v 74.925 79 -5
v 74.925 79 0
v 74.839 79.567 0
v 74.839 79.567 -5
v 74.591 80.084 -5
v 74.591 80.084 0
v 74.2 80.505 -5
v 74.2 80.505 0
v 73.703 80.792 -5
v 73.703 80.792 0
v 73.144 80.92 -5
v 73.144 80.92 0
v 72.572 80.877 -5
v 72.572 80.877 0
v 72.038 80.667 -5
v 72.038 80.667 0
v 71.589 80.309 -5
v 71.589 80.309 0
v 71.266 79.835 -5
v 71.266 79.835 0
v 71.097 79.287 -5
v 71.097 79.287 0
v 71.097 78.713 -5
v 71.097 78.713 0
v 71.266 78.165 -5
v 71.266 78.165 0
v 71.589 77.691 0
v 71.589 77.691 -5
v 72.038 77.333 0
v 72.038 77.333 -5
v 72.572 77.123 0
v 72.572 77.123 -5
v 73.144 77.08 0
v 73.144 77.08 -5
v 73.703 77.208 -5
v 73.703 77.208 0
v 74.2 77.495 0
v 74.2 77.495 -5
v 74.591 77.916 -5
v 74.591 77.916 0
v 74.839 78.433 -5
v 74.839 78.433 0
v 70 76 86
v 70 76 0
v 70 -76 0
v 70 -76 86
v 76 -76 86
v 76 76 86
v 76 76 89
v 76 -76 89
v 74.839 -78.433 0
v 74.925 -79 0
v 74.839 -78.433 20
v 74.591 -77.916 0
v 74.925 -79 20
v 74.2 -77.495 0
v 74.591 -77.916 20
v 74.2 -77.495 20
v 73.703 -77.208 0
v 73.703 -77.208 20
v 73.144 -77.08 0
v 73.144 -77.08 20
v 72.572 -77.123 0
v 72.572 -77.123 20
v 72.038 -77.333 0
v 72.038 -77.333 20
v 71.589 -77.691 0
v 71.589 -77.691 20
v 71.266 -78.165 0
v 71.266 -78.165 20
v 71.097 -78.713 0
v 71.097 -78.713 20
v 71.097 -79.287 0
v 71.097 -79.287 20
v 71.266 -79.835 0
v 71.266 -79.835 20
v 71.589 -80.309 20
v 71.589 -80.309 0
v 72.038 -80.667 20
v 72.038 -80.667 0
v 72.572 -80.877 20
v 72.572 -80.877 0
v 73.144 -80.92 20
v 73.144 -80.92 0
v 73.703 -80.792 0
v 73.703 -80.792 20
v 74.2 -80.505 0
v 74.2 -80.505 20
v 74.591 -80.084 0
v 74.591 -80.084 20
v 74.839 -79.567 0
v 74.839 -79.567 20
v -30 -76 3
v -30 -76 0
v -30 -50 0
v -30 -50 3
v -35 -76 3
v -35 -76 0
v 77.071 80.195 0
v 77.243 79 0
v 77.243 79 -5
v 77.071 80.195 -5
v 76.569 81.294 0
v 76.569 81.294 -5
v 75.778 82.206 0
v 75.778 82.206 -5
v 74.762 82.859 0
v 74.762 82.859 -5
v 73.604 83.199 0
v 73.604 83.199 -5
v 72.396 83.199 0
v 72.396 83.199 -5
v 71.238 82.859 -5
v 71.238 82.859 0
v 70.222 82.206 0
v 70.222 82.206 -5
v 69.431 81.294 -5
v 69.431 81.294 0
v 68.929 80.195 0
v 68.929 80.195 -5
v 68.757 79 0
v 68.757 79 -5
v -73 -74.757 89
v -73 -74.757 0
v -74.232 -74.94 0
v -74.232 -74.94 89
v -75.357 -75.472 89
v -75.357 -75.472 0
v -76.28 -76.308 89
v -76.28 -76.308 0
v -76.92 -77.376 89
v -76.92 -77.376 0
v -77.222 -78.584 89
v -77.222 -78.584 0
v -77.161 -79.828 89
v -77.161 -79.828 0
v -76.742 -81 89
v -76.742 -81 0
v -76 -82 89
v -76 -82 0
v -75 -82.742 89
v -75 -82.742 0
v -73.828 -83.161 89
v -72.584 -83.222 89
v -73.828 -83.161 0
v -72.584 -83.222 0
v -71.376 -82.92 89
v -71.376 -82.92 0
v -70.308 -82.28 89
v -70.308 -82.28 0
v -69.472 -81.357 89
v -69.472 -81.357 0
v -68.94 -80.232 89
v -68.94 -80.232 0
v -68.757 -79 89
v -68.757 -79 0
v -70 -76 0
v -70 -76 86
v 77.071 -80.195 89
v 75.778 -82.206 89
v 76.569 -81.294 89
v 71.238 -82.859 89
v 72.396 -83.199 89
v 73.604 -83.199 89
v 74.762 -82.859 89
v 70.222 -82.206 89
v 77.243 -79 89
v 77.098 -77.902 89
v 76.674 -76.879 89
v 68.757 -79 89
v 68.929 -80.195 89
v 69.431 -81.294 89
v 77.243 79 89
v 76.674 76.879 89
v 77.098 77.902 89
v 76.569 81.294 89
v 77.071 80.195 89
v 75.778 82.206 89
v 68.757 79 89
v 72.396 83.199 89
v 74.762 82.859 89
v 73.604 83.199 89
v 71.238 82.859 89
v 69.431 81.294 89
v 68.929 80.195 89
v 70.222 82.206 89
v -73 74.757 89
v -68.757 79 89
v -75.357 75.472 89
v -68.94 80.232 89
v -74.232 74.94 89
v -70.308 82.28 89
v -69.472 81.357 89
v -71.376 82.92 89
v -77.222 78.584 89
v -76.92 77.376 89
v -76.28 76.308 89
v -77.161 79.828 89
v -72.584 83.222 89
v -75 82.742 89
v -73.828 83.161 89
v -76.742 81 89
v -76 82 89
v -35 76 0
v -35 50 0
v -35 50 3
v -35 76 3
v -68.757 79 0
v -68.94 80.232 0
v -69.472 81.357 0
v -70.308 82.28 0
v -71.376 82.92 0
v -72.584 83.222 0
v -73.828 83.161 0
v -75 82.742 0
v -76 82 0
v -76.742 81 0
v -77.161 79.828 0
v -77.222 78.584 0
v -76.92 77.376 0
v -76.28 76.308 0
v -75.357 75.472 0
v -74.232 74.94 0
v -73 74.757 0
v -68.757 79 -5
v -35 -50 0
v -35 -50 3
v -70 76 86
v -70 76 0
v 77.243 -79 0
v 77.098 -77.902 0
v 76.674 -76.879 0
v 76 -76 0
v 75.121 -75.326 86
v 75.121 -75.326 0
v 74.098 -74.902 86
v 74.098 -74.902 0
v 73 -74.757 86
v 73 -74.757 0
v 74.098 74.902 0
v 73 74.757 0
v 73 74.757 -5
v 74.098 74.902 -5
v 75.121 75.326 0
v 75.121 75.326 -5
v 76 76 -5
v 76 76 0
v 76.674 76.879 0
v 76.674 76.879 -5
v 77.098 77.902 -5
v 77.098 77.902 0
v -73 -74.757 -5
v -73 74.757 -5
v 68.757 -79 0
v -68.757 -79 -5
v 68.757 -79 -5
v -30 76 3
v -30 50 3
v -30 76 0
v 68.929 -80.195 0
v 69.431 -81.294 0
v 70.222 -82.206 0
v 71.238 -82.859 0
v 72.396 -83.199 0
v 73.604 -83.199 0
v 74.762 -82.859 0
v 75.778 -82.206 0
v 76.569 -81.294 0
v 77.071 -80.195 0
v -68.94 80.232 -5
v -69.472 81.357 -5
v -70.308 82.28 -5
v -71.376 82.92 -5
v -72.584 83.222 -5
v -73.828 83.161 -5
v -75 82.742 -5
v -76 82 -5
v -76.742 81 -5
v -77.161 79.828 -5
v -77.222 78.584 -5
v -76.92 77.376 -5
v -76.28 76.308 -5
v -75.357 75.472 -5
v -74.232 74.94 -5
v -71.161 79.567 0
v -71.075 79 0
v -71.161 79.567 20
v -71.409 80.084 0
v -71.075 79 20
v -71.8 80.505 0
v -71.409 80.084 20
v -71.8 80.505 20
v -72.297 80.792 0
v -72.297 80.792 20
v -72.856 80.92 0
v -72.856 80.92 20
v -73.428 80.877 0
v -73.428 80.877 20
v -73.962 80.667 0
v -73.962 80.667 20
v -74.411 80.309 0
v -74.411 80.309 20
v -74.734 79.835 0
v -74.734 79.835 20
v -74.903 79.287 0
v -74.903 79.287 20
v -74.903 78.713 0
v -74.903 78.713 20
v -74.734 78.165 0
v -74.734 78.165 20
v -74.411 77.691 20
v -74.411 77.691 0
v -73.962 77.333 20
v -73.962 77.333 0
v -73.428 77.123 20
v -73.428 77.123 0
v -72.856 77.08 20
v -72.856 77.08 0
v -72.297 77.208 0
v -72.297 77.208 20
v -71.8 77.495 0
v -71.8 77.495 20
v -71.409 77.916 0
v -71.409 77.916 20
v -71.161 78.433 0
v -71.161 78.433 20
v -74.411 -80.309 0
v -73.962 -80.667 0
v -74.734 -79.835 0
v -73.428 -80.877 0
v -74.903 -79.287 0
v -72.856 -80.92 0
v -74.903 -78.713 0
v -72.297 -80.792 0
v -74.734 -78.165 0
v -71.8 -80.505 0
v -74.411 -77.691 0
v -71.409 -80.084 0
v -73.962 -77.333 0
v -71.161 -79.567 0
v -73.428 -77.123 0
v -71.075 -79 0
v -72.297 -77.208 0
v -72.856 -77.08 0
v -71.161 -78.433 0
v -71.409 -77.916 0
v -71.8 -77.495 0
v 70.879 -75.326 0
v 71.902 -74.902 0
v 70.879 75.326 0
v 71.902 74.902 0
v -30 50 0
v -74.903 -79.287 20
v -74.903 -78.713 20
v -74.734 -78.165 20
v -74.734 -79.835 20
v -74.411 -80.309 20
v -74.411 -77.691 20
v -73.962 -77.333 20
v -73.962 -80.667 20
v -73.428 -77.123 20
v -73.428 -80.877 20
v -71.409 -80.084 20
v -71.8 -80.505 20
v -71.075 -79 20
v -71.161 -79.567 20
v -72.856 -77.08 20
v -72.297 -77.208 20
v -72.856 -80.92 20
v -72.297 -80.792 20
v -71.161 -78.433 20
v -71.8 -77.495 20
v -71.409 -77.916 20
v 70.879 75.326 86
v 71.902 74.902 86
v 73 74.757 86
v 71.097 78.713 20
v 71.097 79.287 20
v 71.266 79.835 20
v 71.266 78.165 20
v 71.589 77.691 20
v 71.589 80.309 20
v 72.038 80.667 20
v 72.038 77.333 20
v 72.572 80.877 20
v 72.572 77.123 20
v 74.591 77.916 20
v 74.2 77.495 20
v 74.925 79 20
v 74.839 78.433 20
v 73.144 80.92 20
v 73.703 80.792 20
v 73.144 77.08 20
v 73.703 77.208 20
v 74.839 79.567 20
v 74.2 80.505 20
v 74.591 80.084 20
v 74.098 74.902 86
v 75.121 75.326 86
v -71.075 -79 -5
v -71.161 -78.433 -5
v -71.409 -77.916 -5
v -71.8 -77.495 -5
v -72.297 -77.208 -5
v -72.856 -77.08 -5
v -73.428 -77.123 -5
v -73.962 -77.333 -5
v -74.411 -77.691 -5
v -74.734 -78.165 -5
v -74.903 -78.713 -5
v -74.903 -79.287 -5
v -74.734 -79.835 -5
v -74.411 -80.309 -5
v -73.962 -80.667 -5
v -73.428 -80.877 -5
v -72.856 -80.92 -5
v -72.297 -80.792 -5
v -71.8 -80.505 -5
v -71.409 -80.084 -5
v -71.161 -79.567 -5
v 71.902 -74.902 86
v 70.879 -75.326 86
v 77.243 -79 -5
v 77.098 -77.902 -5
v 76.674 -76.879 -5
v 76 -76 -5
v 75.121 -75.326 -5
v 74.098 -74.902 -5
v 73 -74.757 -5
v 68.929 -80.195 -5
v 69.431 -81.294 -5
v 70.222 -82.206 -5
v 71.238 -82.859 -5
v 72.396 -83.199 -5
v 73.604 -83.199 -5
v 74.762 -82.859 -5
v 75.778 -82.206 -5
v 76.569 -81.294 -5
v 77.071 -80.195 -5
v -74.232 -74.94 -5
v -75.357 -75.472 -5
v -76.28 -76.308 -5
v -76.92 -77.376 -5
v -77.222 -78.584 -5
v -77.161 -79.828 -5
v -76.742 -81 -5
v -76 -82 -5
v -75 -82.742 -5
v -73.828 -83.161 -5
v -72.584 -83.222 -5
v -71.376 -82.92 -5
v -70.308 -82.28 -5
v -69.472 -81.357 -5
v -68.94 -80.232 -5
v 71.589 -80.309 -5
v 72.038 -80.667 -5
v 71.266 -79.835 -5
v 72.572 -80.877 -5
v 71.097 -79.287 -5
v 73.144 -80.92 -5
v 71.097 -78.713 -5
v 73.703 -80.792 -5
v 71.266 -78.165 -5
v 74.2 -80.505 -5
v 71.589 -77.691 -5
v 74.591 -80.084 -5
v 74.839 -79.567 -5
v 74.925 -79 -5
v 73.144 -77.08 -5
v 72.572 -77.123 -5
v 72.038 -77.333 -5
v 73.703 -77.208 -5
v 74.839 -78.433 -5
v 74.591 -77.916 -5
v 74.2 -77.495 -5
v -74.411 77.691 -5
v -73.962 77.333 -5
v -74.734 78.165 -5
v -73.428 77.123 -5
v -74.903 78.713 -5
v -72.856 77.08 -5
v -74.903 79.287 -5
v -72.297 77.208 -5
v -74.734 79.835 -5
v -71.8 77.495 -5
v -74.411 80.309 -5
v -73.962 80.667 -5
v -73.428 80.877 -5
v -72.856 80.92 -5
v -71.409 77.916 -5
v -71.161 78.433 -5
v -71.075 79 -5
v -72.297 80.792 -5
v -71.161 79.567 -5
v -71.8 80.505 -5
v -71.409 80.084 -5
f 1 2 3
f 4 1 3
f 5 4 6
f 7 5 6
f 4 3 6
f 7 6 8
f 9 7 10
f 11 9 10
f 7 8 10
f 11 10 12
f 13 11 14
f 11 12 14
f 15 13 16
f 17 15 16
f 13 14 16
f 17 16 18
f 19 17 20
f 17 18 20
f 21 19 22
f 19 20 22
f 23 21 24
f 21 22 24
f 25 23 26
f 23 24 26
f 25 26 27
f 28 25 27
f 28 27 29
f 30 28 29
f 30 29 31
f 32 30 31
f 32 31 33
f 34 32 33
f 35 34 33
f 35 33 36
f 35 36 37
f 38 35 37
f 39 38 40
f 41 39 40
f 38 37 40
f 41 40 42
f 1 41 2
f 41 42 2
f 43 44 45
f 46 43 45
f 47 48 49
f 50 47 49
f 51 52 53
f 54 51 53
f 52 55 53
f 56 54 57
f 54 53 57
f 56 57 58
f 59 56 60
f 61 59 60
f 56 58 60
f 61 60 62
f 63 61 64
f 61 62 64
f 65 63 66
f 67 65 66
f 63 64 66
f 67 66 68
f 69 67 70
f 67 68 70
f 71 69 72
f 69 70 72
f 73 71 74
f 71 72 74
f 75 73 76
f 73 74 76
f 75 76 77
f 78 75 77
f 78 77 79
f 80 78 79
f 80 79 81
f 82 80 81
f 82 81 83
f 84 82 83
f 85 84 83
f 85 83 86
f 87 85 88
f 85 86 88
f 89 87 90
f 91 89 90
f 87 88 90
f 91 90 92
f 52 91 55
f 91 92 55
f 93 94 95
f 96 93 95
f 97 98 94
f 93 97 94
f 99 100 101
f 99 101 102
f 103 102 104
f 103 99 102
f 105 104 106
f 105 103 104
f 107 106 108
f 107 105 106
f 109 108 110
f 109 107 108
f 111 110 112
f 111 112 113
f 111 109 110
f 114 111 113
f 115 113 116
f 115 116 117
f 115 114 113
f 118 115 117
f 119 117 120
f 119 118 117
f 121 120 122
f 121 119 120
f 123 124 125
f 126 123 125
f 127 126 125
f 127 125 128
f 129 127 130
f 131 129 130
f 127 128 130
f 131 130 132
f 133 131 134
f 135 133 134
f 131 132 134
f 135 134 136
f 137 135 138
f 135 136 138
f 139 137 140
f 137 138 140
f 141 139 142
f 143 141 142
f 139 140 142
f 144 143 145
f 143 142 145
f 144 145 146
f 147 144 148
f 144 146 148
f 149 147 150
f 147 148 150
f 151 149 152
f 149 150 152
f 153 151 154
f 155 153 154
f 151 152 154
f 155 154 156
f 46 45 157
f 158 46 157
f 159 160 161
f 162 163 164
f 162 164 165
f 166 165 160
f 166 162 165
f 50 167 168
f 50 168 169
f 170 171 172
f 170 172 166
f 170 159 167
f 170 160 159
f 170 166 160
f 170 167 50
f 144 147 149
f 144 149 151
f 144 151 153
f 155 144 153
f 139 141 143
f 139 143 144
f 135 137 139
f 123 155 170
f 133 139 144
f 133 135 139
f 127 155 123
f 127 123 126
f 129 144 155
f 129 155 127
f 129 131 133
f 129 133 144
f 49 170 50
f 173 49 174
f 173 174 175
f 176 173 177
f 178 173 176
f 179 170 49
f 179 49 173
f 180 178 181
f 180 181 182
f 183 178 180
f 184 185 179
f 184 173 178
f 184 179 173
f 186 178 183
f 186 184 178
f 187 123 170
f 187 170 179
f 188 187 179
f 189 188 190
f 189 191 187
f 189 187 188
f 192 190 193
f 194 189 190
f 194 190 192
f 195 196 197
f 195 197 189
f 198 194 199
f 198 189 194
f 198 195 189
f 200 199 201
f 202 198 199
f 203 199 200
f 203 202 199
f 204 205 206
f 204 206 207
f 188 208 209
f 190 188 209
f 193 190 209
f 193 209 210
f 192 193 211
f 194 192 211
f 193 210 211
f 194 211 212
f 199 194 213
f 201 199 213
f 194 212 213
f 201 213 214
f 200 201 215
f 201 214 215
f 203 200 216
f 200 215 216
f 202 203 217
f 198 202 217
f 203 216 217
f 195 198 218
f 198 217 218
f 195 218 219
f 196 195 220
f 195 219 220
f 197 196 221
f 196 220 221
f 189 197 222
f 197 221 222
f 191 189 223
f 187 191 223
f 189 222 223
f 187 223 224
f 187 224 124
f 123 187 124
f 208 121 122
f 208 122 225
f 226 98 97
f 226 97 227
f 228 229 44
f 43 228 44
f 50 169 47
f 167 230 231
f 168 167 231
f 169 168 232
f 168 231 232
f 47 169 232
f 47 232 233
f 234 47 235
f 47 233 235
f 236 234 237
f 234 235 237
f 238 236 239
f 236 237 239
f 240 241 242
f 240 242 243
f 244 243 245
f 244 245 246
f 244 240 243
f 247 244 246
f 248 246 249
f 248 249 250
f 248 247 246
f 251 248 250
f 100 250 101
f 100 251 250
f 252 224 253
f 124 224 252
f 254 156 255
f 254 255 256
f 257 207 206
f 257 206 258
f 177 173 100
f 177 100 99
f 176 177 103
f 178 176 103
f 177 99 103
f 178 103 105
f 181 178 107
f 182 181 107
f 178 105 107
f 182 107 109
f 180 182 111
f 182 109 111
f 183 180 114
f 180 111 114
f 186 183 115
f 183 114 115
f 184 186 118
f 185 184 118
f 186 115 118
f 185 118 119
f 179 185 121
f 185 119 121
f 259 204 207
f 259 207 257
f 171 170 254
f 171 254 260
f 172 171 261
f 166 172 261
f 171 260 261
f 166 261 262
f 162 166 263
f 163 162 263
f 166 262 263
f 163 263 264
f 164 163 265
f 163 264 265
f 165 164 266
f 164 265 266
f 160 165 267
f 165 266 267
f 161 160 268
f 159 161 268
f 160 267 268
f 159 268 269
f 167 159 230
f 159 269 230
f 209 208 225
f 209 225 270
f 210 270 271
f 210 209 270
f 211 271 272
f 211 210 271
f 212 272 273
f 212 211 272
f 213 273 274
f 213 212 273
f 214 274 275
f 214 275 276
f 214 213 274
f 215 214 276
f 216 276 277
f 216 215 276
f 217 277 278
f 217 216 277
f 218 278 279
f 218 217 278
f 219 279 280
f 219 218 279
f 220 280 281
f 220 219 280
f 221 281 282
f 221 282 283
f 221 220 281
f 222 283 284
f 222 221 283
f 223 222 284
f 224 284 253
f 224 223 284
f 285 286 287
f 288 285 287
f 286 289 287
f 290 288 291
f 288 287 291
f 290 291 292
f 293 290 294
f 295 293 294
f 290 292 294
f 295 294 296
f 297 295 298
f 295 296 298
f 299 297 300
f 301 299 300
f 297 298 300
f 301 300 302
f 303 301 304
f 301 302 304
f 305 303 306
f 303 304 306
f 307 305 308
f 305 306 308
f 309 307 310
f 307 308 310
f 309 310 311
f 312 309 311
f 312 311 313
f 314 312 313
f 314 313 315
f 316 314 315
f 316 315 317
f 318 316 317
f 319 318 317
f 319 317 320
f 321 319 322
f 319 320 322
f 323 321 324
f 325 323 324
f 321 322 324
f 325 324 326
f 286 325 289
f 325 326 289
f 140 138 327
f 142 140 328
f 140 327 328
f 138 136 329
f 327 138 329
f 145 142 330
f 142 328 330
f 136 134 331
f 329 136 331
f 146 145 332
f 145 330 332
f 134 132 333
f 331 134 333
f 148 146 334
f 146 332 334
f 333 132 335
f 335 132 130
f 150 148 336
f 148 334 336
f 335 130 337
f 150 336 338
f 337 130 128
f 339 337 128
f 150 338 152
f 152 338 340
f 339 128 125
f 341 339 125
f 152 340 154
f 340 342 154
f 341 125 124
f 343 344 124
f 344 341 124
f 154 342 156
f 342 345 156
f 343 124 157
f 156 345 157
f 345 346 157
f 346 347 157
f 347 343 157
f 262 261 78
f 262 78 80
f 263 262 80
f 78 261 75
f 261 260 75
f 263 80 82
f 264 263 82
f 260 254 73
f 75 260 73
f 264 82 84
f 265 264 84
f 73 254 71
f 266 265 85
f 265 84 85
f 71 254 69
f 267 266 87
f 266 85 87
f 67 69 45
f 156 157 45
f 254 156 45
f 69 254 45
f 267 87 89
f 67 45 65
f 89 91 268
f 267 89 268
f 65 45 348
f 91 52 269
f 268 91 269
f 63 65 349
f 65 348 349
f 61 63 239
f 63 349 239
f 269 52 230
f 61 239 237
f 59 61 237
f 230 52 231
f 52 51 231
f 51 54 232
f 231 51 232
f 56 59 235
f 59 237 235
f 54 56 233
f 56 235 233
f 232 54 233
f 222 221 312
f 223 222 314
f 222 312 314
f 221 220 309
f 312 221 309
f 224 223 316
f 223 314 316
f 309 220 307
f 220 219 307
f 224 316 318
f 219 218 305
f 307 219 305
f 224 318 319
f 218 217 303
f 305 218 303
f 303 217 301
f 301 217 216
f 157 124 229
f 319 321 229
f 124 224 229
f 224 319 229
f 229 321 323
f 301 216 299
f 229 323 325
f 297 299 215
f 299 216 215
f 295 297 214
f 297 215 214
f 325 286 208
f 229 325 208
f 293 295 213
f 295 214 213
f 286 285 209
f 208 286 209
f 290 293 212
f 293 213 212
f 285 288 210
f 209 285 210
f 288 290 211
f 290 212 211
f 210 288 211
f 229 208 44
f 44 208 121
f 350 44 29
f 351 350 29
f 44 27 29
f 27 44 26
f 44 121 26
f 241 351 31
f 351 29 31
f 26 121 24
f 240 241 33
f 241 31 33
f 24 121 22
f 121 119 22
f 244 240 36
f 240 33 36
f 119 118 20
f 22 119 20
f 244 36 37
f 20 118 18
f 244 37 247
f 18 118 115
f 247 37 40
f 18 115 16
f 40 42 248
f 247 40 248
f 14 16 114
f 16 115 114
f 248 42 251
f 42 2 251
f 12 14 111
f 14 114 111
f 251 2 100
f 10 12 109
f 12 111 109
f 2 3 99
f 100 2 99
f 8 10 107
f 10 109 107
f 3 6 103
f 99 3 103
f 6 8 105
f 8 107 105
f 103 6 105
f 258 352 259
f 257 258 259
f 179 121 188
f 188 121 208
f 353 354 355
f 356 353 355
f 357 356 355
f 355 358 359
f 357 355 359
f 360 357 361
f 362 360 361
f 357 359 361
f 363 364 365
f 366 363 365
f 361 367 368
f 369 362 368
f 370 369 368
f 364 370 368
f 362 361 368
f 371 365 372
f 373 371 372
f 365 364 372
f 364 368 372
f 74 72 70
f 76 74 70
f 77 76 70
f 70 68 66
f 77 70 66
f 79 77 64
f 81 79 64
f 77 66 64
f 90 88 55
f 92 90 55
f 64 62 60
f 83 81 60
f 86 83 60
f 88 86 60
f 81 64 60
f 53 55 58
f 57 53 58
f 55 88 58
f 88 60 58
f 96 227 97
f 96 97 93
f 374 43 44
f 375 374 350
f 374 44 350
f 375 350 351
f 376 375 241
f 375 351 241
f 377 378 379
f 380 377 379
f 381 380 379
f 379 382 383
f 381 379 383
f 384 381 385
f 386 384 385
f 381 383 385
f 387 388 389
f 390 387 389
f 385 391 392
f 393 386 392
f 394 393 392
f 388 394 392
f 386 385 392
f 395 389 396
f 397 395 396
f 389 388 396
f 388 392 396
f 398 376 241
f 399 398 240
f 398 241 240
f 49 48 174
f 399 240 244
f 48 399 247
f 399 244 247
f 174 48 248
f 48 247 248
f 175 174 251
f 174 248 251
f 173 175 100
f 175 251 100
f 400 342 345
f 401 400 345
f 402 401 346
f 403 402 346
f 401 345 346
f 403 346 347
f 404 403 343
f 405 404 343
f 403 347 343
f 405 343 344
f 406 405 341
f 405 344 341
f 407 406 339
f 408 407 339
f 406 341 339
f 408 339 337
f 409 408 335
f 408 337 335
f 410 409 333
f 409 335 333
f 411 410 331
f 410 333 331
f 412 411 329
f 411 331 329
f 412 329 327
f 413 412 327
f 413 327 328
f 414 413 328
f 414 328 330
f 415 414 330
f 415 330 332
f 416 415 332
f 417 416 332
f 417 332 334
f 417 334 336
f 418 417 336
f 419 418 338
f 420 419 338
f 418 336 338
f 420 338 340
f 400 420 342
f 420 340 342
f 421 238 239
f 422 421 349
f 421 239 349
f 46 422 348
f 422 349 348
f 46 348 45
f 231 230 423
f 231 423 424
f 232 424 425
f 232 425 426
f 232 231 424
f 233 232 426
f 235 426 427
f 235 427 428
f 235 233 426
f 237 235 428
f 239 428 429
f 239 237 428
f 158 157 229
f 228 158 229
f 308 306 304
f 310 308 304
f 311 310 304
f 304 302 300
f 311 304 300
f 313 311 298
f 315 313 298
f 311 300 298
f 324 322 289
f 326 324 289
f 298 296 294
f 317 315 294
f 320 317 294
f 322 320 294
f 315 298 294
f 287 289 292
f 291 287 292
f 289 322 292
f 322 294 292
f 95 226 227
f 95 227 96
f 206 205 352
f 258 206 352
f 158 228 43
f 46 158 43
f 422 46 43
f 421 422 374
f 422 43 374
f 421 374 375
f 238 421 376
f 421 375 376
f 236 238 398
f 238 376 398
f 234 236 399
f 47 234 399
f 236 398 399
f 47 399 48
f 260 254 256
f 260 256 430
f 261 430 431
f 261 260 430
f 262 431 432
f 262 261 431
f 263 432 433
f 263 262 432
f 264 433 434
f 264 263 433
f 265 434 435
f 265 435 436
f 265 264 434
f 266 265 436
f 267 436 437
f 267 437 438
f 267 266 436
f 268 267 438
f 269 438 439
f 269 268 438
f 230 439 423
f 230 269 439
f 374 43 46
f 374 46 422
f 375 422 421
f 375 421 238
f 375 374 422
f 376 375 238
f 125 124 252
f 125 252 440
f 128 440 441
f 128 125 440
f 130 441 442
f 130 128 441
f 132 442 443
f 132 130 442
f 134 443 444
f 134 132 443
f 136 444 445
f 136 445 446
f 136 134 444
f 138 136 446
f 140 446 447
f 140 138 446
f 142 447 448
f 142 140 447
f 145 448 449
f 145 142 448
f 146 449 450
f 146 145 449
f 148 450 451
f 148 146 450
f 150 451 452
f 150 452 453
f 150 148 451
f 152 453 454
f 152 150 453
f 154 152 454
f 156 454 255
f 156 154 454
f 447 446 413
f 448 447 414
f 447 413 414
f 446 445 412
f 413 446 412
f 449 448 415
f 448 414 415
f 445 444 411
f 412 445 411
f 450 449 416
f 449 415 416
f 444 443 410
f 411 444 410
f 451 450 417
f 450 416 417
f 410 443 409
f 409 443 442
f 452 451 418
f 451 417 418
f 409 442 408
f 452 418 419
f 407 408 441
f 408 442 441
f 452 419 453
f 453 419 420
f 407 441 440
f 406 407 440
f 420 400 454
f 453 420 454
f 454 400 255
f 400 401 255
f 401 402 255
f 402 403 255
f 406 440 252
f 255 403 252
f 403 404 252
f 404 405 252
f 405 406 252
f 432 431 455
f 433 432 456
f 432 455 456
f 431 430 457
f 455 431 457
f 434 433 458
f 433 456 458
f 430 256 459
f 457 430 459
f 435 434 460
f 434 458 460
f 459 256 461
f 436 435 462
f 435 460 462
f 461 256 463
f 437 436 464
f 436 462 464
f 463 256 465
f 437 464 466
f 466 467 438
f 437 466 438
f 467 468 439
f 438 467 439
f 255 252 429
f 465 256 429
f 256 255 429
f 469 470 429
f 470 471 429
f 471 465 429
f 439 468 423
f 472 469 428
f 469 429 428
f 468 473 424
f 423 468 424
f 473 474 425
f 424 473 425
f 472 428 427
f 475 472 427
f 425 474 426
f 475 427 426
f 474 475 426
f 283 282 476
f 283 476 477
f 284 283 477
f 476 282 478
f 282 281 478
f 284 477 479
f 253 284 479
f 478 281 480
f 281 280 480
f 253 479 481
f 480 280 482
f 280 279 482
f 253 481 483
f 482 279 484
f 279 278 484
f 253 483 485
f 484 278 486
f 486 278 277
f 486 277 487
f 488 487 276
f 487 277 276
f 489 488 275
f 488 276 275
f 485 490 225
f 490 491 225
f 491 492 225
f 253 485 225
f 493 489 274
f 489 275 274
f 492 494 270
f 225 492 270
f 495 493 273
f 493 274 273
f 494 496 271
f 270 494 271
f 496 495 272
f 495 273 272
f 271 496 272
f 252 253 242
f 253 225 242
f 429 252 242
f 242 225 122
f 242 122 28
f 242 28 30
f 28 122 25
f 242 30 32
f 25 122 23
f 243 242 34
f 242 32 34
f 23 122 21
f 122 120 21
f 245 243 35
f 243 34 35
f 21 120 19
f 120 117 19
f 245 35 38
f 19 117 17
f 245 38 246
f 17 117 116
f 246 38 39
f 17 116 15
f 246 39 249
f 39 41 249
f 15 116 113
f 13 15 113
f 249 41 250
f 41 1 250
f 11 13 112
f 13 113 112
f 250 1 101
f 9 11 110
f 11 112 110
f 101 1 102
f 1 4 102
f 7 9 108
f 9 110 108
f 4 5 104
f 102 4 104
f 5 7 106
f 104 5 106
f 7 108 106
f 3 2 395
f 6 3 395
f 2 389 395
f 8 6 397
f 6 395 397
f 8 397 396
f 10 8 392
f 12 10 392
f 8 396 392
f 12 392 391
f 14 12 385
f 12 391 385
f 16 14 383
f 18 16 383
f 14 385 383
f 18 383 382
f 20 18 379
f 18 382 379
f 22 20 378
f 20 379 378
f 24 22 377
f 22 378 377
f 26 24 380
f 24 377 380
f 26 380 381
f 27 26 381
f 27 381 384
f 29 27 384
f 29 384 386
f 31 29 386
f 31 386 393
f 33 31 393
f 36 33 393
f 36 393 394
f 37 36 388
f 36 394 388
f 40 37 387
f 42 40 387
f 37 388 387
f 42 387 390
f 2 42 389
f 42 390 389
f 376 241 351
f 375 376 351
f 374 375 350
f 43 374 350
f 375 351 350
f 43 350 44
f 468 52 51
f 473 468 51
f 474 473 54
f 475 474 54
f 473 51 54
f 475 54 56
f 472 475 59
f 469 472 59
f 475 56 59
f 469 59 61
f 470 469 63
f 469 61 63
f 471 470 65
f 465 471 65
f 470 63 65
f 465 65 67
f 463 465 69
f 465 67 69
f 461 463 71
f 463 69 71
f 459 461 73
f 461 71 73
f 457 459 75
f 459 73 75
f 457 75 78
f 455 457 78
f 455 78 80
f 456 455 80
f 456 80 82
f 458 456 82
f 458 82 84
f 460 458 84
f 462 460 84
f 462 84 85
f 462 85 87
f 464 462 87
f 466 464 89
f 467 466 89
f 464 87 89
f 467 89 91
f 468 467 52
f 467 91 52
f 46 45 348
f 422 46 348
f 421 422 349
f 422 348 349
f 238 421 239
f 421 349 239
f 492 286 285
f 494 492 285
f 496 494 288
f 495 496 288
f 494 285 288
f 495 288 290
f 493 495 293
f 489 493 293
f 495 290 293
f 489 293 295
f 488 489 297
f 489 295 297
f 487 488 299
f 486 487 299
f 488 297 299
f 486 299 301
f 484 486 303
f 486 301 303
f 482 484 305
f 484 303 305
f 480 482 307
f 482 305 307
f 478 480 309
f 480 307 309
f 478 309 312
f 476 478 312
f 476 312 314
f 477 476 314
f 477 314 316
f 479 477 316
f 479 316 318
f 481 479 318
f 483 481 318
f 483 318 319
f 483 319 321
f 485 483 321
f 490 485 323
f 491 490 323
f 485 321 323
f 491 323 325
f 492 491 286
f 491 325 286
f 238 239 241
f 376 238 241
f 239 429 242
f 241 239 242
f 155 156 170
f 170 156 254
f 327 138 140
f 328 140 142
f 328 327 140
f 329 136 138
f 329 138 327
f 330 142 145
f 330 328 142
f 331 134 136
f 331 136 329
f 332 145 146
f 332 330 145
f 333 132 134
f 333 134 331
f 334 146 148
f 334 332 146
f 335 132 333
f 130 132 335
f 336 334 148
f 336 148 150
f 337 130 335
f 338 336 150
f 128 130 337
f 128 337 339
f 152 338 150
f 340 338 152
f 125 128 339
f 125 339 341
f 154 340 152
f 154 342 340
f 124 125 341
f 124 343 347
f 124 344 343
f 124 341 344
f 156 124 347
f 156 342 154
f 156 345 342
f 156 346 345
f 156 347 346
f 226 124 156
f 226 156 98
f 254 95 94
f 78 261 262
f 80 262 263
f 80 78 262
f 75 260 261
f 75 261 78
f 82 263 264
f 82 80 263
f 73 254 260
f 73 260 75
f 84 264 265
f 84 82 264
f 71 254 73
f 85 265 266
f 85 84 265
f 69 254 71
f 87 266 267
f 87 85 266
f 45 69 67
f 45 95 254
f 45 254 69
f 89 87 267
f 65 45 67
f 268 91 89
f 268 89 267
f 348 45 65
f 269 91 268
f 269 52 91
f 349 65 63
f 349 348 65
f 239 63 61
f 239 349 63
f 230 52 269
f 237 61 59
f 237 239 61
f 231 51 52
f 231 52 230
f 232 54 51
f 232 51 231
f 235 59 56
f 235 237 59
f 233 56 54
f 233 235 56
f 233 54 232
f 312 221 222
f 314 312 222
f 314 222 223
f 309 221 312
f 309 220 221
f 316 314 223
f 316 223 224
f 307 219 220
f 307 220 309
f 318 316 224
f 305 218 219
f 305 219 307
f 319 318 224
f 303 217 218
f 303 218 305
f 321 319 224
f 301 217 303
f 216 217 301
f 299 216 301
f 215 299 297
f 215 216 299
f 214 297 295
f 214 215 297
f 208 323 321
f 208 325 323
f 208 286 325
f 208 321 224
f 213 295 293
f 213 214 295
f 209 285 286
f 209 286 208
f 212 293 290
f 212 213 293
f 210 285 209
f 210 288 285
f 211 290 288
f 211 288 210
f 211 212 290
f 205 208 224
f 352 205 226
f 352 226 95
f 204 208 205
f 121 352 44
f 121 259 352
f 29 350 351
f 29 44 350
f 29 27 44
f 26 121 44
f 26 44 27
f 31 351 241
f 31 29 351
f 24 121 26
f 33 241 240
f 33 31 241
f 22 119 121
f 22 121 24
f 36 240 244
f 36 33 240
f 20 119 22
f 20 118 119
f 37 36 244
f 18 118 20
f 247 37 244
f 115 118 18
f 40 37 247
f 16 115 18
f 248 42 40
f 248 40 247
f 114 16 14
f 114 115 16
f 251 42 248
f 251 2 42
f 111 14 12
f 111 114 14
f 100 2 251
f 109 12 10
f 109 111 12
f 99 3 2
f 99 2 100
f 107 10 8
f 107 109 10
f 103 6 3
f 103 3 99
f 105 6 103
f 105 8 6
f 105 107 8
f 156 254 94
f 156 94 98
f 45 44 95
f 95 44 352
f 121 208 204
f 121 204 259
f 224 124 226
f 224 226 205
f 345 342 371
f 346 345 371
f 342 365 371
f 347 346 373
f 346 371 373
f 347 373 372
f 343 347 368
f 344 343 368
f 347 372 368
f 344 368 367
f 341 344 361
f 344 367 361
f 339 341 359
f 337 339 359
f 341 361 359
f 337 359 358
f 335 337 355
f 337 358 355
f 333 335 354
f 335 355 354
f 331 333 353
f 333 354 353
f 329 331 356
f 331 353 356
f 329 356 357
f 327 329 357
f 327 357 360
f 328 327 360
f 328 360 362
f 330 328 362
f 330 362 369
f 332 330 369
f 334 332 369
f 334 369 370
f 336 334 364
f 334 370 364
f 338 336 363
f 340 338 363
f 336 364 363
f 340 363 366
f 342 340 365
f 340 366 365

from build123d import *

# Parameters (mm, degrees)
F0_W          = 5
F0_H          = 26
F1_DEPTH      = 5
F2_DEPTH      = 86
F3_DEPTH      = 3
F4_DEPTH      = 89
F5_START      = 86
F5_DEPTH      = 3
F6_R          = 1.925
F7_DEPTH      = 20
F7_DEPTH_BACK = 5
F8_DEPTH      = 3
F9_DEPTH      = 1.2426406871
F10_DEPTH     = 1.2426406871


# Not quite as in the source:
# - a feature names something its author has since deleted; it is built from what else it names


with BuildPart() as f1:
    # F0 (on Top) → F1 (new body)
    with BuildSketch(Plane.XY):
        with BuildLine():
            ThreePointArc((73, 74.7573593129), (71.3764116996, 75.0803111054), (70, 76))
            Line((70, 76), (70, -76))
            ThreePointArc((70, -76), (71.3764116996, -75.0803111054), (73, -74.7573593129))
            Line((73, -74.7573593129), (73, 74.7573593129))
        make_face()
        Polygon((70, -76), (70, 76), (-30, 76), (-30, 50), (-30, -50), (-30, -76), align=None)
        Polygon((-35, 50), (-35, 76), (-70, 76), (-70, -76), (-35, -76), (-35, -50), (-30, -50), (-30, 50), align=None)
        with Locations((-32.5, -63)):
            Rectangle(F0_W, F0_H)
        with Locations((-32.5, 63)):
            Rectangle(F0_W, F0_H)
        with BuildLine():
            Line((-70, -76), (-70, 76))
            ThreePointArc((-70, 76), (-71.3764116996, 75.0803111054), (-73, 74.7573593129))
            Line((-73, 74.7573593129), (-73, -74.7573593129))
            ThreePointArc((-73, -74.7573593129), (-71.3764116996, -75.0803111054), (-70, -76))
        make_face()
        with BuildLine():
            ThreePointArc((73, -74.7573593129), (71.3764116996, -75.0803111054), (70, -76))
            Line((70, -76), (73, -76))
            Line((73, -76), (73, -74.7573593129))
        make_face()
        with BuildLine():
            Line((73, -76), (70, -76))
            ThreePointArc((70, -76), (69.0803111054, -77.3764116996), (68.7573593129, -79))
            Line((68.7573593129, -79), (73, -79))
            Line((73, -79), (73, -76))
        make_face()
        with BuildLine():
            Line((73, -74.7573593129), (73, -76))
            Line((73, -76), (73, -79))
            Line((73, -79), (68.7573593129, -79))
            ThreePointArc((68.7573593129, -79), (73, -83.2426406871), (77.2426406871, -79))
            ThreePointArc((77.2426406871, -79), (76, -76), (73, -74.7573593129))
        make_face()
        with BuildLine():
            Line((73, 76), (70, 76))
            ThreePointArc((70, 76), (71.3764116996, 75.0803111054), (73, 74.7573593129))
            Line((73, 74.7573593129), (73, 76))
        make_face()
        with BuildLine():
            ThreePointArc((68.7573593129, 79), (69.0803111054, 77.3764116996), (70, 76))
            Line((70, 76), (73, 76))
            Line((73, 76), (73, 79))
            Line((73, 79), (68.7573593129, 79))
        make_face()
        with BuildLine():
            Line((73, 79), (73, 76))
            Line((73, 76), (73, 74.7573593129))
            ThreePointArc((73, 74.7573593129), (76, 76), (77.2426406871, 79))
            ThreePointArc((77.2426406871, 79), (73, 83.2426406871), (68.7573593129, 79))
            Line((68.7573593129, 79), (73, 79))
        make_face()
        with BuildLine():
            Line((-30, 76), (70, 76))
            ThreePointArc((70, 76), (69.0803111054, 77.3764116996), (68.7573593129, 79))
            Line((68.7573593129, 79), (-68.7573593129, 79))
            ThreePointArc((-68.7573593129, 79), (-69.0803111054, 77.3764116996), (-70, 76))
            Line((-70, 76), (-35, 76))
            Line((-35, 76), (-30, 76))
        make_face()
        with BuildLine():
            ThreePointArc((-70, 76), (-69.0803111054, 77.3764116996), (-68.7573593129, 79))
            Line((-68.7573593129, 79), (-73, 79))
            Line((-73, 79), (-73, 74.7573593129))
            ThreePointArc((-73, 74.7573593129), (-71.3764116996, 75.0803111054), (-70, 76))
        make_face()
        with BuildLine():
            Line((-73, 79), (-68.7573593129, 79))
            ThreePointArc((-68.7573593129, 79), (-76, 82), (-73, 74.7573593129))
            Line((-73, 74.7573593129), (-73, 79))
        make_face()
        with BuildLine():
            Line((-73, -79), (-68.7573593129, -79))
            ThreePointArc((-68.7573593129, -79), (-69.0803111054, -77.3764116996), (-70, -76))
            ThreePointArc((-70, -76), (-71.3764116996, -75.0803111054), (-73, -74.7573593129))
            Line((-73, -74.7573593129), (-73, -79))
        make_face()
        with BuildLine():
            ThreePointArc((-73, -74.7573593129), (-76, -82), (-68.7573593129, -79))
            Line((-68.7573593129, -79), (-73, -79))
            Line((-73, -79), (-73, -74.7573593129))
        make_face()
        with BuildLine():
            ThreePointArc((68.7573593129, -79), (69.0803111054, -77.3764116996), (70, -76))
            Line((70, -76), (-30, -76))
            Line((-30, -76), (-35, -76))
            Line((-35, -76), (-70, -76))
            ThreePointArc((-70, -76), (-69.0803111054, -77.3764116996), (-68.7573593129, -79))
            Line((-68.7573593129, -79), (68.7573593129, -79))
        make_face()
    extrude(amount=-F1_DEPTH)

    # F0 (on Top) → F2 (join)
    with BuildSketch(Plane.XY):
        with BuildLine():
            ThreePointArc((73, 74.7573593129), (71.3764116996, 75.0803111054), (70, 76))
            Line((70, 76), (70, -76))
            ThreePointArc((70, -76), (71.3764116996, -75.0803111054), (73, -74.7573593129))
            Line((73, -74.7573593129), (73, 74.7573593129))
        make_face()
    extrude(amount=F2_DEPTH)

    # F0 (on Top) → F3 (join)
    with BuildSketch(Plane.XY):
        with Locations((-32.5, 63)):
            Rectangle(F0_W, F0_H)
        with Locations((-32.5, -63)):
            Rectangle(F0_W, F0_H)
    extrude(amount=F3_DEPTH)


with BuildPart() as f4:
    # F0 (on Top) → F4 (new body)
    with BuildSketch(Plane.XY):
        with BuildLine():
            Line((-70, -76), (-70, 76))
            ThreePointArc((-70, 76), (-71.3764116996, 75.0803111054), (-73, 74.7573593129))
            Line((-73, 74.7573593129), (-73, -74.7573593129))
            ThreePointArc((-73, -74.7573593129), (-71.3764116996, -75.0803111054), (-70, -76))
        make_face()
        with BuildLine():
            Line((73, -76), (70, -76))
            ThreePointArc((70, -76), (69.0803111054, -77.3764116996), (68.7573593129, -79))
            Line((68.7573593129, -79), (73, -79))
            Line((73, -79), (73, -76))
        make_face()
        with BuildLine():
            ThreePointArc((68.7573593129, 79), (69.0803111054, 77.3764116996), (70, 76))
            Line((70, 76), (73, 76))
            Line((73, 76), (73, 79))
            Line((73, 79), (68.7573593129, 79))
        make_face()
        with BuildLine():
            Line((73, 79), (73, 76))
            Line((73, 76), (73, 74.7573593129))
            ThreePointArc((73, 74.7573593129), (76, 76), (77.2426406871, 79))
            ThreePointArc((77.2426406871, 79), (73, 83.2426406871), (68.7573593129, 79))
            Line((68.7573593129, 79), (73, 79))
        make_face()
        with BuildLine():
            Line((73, -74.7573593129), (73, -76))
            Line((73, -76), (73, -79))
            Line((73, -79), (68.7573593129, -79))
            ThreePointArc((68.7573593129, -79), (73, -83.2426406871), (77.2426406871, -79))
            ThreePointArc((77.2426406871, -79), (76, -76), (73, -74.7573593129))
        make_face()
        with BuildLine():
            ThreePointArc((73, -74.7573593129), (71.3764116996, -75.0803111054), (70, -76))
            Line((70, -76), (73, -76))
            Line((73, -76), (73, -74.7573593129))
        make_face()
        with BuildLine():
            Line((73, 76), (70, 76))
            ThreePointArc((70, 76), (71.3764116996, 75.0803111054), (73, 74.7573593129))
            Line((73, 74.7573593129), (73, 76))
        make_face()
        with BuildLine():
            Line((-73, -79), (-68.7573593129, -79))
            ThreePointArc((-68.7573593129, -79), (-69.0803111054, -77.3764116996), (-70, -76))
            ThreePointArc((-70, -76), (-71.3764116996, -75.0803111054), (-73, -74.7573593129))
            Line((-73, -74.7573593129), (-73, -79))
        make_face()
        with BuildLine():
            ThreePointArc((68.7573593129, -79), (69.0803111054, -77.3764116996), (70, -76))
            Line((70, -76), (-30, -76))
            Line((-30, -76), (-35, -76))
            Line((-35, -76), (-70, -76))
            ThreePointArc((-70, -76), (-69.0803111054, -77.3764116996), (-68.7573593129, -79))
            Line((-68.7573593129, -79), (68.7573593129, -79))
        make_face()
        with BuildLine():
            ThreePointArc((-73, -74.7573593129), (-76, -82), (-68.7573593129, -79))
            Line((-68.7573593129, -79), (-73, -79))
            Line((-73, -79), (-73, -74.7573593129))
        make_face()
        with BuildLine():
            Line((-30, 76), (70, 76))
            ThreePointArc((70, 76), (69.0803111054, 77.3764116996), (68.7573593129, 79))
            Line((68.7573593129, 79), (-68.7573593129, 79))
            ThreePointArc((-68.7573593129, 79), (-69.0803111054, 77.3764116996), (-70, 76))
            Line((-70, 76), (-35, 76))
            Line((-35, 76), (-30, 76))
        make_face()
        with BuildLine():
            Line((-73, 79), (-68.7573593129, 79))
            ThreePointArc((-68.7573593129, 79), (-76, 82), (-73, 74.7573593129))
            Line((-73, 74.7573593129), (-73, 79))
        make_face()
        with BuildLine():
            ThreePointArc((-70, 76), (-69.0803111054, 77.3764116996), (-68.7573593129, 79))
            Line((-68.7573593129, 79), (-73, 79))
            Line((-73, 79), (-73, 74.7573593129))
            ThreePointArc((-73, 74.7573593129), (-71.3764116996, 75.0803111054), (-70, 76))
        make_face()
    extrude(amount=F4_DEPTH)

    # F0 (on Top) → F5 (join)
    with BuildSketch(Plane.XY.offset(F5_START)):
        Polygon((70, -76), (70, 76), (-30, 76), (-30, 50), (-30, -50), (-30, -76), align=None)
        Polygon((-35, 50), (-35, 76), (-70, 76), (-70, -76), (-35, -76), (-35, -50), (-30, -50), (-30, 50), align=None)
        with Locations((-32.5, 63)):
            Rectangle(F0_W, F0_H)
        with Locations((-32.5, -63)):
            Rectangle(F0_W, F0_H)
        with BuildLine():
            ThreePointArc((73, 74.7573593129), (71.3764116996, 75.0803111054), (70, 76))
            Line((70, 76), (70, -76))
            ThreePointArc((70, -76), (71.3764116996, -75.0803111054), (73, -74.7573593129))
            Line((73, -74.7573593129), (73, 74.7573593129))
        make_face()
        with BuildLine():
            ThreePointArc((73, -74.7573593129), (71.3764116996, -75.0803111054), (70, -76))
            Line((70, -76), (73, -76))
            Line((73, -76), (73, -74.7573593129))
        make_face()
        with BuildLine():
            Line((73, 76), (70, 76))
            ThreePointArc((70, 76), (71.3764116996, 75.0803111054), (73, 74.7573593129))
            Line((73, 74.7573593129), (73, 76))
        make_face()
        with BuildLine():
            ThreePointArc((68.7573593129, 79), (69.0803111054, 77.3764116996), (70, 76))
            Line((70, 76), (73, 76))
            Line((73, 76), (73, 79))
            Line((73, 79), (68.7573593129, 79))
        make_face()
        with BuildLine():
            Line((-70, -76), (-70, 76))
            ThreePointArc((-70, 76), (-71.3764116996, 75.0803111054), (-73, 74.7573593129))
            Line((-73, 74.7573593129), (-73, -74.7573593129))
            ThreePointArc((-73, -74.7573593129), (-71.3764116996, -75.0803111054), (-70, -76))
        make_face()
        with BuildLine():
            Line((73, 79), (73, 76))
            Line((73, 76), (73, 74.7573593129))
            ThreePointArc((73, 74.7573593129), (76, 76), (77.2426406871, 79))
            ThreePointArc((77.2426406871, 79), (73, 83.2426406871), (68.7573593129, 79))
            Line((68.7573593129, 79), (73, 79))
        make_face()
        with BuildLine():
            Line((73, -76), (70, -76))
            ThreePointArc((70, -76), (69.0803111054, -77.3764116996), (68.7573593129, -79))
            Line((68.7573593129, -79), (73, -79))
            Line((73, -79), (73, -76))
        make_face()
        with BuildLine():
            Line((73, -74.7573593129), (73, -76))
            Line((73, -76), (73, -79))
            Line((73, -79), (68.7573593129, -79))
            ThreePointArc((68.7573593129, -79), (73, -83.2426406871), (77.2426406871, -79))
            ThreePointArc((77.2426406871, -79), (76, -76), (73, -74.7573593129))
        make_face()
    extrude(amount=F5_DEPTH)


with BuildPart() as f7_tool:
    # F6 (on Top) → F7 (new body, two sides)
    with BuildSketch(Plane.XY) as f7_sk:
        with Locations((73, -79)):
            Circle(F6_R)
        with Locations((73, 79)):
            Circle(F6_R)
        with Locations((-73, -79)):
            Circle(F6_R)
        with Locations((-73, 79)):
            Circle(F6_R)
    extrude(amount=F7_DEPTH)
    extrude(f7_sk.sketch, amount=-F7_DEPTH_BACK)


with BuildPart() as f1_1:
    add(f1.part)

    # F7: cut by f7_tool
    add(f7_tool.part, mode=Mode.SUBTRACT)


with BuildPart() as f4_1:
    add(f4.part)

    # F7: cut by f7_tool
    add(f7_tool.part, mode=Mode.SUBTRACT)

    # F8 (add): a face of the model
    f8_faces = [f4_1.faces().sort_by_distance(p)[0] for p in [
        (73, 0, 87.5),
    ]]
    extrude(f8_faces, amount=F8_DEPTH)

    # F9 (add, through all): a face of the model
    f9_faces = [f4_1.faces().sort_by_distance(p)[0] for p in [
        (74.5, -74.7573593129, 87.5),
    ]]
    extrude(f9_faces, amount=F9_DEPTH)

    # F10 (add, through all): a face of the model
    f10_faces = [f4_1.faces().sort_by_distance(p)[0] for p in [
        (74.5, 74.7573593129, 87.5),
    ]]
    extrude(f10_faces, amount=F10_DEPTH)


solid = Compound([f1_1.part, f4_1.part])
